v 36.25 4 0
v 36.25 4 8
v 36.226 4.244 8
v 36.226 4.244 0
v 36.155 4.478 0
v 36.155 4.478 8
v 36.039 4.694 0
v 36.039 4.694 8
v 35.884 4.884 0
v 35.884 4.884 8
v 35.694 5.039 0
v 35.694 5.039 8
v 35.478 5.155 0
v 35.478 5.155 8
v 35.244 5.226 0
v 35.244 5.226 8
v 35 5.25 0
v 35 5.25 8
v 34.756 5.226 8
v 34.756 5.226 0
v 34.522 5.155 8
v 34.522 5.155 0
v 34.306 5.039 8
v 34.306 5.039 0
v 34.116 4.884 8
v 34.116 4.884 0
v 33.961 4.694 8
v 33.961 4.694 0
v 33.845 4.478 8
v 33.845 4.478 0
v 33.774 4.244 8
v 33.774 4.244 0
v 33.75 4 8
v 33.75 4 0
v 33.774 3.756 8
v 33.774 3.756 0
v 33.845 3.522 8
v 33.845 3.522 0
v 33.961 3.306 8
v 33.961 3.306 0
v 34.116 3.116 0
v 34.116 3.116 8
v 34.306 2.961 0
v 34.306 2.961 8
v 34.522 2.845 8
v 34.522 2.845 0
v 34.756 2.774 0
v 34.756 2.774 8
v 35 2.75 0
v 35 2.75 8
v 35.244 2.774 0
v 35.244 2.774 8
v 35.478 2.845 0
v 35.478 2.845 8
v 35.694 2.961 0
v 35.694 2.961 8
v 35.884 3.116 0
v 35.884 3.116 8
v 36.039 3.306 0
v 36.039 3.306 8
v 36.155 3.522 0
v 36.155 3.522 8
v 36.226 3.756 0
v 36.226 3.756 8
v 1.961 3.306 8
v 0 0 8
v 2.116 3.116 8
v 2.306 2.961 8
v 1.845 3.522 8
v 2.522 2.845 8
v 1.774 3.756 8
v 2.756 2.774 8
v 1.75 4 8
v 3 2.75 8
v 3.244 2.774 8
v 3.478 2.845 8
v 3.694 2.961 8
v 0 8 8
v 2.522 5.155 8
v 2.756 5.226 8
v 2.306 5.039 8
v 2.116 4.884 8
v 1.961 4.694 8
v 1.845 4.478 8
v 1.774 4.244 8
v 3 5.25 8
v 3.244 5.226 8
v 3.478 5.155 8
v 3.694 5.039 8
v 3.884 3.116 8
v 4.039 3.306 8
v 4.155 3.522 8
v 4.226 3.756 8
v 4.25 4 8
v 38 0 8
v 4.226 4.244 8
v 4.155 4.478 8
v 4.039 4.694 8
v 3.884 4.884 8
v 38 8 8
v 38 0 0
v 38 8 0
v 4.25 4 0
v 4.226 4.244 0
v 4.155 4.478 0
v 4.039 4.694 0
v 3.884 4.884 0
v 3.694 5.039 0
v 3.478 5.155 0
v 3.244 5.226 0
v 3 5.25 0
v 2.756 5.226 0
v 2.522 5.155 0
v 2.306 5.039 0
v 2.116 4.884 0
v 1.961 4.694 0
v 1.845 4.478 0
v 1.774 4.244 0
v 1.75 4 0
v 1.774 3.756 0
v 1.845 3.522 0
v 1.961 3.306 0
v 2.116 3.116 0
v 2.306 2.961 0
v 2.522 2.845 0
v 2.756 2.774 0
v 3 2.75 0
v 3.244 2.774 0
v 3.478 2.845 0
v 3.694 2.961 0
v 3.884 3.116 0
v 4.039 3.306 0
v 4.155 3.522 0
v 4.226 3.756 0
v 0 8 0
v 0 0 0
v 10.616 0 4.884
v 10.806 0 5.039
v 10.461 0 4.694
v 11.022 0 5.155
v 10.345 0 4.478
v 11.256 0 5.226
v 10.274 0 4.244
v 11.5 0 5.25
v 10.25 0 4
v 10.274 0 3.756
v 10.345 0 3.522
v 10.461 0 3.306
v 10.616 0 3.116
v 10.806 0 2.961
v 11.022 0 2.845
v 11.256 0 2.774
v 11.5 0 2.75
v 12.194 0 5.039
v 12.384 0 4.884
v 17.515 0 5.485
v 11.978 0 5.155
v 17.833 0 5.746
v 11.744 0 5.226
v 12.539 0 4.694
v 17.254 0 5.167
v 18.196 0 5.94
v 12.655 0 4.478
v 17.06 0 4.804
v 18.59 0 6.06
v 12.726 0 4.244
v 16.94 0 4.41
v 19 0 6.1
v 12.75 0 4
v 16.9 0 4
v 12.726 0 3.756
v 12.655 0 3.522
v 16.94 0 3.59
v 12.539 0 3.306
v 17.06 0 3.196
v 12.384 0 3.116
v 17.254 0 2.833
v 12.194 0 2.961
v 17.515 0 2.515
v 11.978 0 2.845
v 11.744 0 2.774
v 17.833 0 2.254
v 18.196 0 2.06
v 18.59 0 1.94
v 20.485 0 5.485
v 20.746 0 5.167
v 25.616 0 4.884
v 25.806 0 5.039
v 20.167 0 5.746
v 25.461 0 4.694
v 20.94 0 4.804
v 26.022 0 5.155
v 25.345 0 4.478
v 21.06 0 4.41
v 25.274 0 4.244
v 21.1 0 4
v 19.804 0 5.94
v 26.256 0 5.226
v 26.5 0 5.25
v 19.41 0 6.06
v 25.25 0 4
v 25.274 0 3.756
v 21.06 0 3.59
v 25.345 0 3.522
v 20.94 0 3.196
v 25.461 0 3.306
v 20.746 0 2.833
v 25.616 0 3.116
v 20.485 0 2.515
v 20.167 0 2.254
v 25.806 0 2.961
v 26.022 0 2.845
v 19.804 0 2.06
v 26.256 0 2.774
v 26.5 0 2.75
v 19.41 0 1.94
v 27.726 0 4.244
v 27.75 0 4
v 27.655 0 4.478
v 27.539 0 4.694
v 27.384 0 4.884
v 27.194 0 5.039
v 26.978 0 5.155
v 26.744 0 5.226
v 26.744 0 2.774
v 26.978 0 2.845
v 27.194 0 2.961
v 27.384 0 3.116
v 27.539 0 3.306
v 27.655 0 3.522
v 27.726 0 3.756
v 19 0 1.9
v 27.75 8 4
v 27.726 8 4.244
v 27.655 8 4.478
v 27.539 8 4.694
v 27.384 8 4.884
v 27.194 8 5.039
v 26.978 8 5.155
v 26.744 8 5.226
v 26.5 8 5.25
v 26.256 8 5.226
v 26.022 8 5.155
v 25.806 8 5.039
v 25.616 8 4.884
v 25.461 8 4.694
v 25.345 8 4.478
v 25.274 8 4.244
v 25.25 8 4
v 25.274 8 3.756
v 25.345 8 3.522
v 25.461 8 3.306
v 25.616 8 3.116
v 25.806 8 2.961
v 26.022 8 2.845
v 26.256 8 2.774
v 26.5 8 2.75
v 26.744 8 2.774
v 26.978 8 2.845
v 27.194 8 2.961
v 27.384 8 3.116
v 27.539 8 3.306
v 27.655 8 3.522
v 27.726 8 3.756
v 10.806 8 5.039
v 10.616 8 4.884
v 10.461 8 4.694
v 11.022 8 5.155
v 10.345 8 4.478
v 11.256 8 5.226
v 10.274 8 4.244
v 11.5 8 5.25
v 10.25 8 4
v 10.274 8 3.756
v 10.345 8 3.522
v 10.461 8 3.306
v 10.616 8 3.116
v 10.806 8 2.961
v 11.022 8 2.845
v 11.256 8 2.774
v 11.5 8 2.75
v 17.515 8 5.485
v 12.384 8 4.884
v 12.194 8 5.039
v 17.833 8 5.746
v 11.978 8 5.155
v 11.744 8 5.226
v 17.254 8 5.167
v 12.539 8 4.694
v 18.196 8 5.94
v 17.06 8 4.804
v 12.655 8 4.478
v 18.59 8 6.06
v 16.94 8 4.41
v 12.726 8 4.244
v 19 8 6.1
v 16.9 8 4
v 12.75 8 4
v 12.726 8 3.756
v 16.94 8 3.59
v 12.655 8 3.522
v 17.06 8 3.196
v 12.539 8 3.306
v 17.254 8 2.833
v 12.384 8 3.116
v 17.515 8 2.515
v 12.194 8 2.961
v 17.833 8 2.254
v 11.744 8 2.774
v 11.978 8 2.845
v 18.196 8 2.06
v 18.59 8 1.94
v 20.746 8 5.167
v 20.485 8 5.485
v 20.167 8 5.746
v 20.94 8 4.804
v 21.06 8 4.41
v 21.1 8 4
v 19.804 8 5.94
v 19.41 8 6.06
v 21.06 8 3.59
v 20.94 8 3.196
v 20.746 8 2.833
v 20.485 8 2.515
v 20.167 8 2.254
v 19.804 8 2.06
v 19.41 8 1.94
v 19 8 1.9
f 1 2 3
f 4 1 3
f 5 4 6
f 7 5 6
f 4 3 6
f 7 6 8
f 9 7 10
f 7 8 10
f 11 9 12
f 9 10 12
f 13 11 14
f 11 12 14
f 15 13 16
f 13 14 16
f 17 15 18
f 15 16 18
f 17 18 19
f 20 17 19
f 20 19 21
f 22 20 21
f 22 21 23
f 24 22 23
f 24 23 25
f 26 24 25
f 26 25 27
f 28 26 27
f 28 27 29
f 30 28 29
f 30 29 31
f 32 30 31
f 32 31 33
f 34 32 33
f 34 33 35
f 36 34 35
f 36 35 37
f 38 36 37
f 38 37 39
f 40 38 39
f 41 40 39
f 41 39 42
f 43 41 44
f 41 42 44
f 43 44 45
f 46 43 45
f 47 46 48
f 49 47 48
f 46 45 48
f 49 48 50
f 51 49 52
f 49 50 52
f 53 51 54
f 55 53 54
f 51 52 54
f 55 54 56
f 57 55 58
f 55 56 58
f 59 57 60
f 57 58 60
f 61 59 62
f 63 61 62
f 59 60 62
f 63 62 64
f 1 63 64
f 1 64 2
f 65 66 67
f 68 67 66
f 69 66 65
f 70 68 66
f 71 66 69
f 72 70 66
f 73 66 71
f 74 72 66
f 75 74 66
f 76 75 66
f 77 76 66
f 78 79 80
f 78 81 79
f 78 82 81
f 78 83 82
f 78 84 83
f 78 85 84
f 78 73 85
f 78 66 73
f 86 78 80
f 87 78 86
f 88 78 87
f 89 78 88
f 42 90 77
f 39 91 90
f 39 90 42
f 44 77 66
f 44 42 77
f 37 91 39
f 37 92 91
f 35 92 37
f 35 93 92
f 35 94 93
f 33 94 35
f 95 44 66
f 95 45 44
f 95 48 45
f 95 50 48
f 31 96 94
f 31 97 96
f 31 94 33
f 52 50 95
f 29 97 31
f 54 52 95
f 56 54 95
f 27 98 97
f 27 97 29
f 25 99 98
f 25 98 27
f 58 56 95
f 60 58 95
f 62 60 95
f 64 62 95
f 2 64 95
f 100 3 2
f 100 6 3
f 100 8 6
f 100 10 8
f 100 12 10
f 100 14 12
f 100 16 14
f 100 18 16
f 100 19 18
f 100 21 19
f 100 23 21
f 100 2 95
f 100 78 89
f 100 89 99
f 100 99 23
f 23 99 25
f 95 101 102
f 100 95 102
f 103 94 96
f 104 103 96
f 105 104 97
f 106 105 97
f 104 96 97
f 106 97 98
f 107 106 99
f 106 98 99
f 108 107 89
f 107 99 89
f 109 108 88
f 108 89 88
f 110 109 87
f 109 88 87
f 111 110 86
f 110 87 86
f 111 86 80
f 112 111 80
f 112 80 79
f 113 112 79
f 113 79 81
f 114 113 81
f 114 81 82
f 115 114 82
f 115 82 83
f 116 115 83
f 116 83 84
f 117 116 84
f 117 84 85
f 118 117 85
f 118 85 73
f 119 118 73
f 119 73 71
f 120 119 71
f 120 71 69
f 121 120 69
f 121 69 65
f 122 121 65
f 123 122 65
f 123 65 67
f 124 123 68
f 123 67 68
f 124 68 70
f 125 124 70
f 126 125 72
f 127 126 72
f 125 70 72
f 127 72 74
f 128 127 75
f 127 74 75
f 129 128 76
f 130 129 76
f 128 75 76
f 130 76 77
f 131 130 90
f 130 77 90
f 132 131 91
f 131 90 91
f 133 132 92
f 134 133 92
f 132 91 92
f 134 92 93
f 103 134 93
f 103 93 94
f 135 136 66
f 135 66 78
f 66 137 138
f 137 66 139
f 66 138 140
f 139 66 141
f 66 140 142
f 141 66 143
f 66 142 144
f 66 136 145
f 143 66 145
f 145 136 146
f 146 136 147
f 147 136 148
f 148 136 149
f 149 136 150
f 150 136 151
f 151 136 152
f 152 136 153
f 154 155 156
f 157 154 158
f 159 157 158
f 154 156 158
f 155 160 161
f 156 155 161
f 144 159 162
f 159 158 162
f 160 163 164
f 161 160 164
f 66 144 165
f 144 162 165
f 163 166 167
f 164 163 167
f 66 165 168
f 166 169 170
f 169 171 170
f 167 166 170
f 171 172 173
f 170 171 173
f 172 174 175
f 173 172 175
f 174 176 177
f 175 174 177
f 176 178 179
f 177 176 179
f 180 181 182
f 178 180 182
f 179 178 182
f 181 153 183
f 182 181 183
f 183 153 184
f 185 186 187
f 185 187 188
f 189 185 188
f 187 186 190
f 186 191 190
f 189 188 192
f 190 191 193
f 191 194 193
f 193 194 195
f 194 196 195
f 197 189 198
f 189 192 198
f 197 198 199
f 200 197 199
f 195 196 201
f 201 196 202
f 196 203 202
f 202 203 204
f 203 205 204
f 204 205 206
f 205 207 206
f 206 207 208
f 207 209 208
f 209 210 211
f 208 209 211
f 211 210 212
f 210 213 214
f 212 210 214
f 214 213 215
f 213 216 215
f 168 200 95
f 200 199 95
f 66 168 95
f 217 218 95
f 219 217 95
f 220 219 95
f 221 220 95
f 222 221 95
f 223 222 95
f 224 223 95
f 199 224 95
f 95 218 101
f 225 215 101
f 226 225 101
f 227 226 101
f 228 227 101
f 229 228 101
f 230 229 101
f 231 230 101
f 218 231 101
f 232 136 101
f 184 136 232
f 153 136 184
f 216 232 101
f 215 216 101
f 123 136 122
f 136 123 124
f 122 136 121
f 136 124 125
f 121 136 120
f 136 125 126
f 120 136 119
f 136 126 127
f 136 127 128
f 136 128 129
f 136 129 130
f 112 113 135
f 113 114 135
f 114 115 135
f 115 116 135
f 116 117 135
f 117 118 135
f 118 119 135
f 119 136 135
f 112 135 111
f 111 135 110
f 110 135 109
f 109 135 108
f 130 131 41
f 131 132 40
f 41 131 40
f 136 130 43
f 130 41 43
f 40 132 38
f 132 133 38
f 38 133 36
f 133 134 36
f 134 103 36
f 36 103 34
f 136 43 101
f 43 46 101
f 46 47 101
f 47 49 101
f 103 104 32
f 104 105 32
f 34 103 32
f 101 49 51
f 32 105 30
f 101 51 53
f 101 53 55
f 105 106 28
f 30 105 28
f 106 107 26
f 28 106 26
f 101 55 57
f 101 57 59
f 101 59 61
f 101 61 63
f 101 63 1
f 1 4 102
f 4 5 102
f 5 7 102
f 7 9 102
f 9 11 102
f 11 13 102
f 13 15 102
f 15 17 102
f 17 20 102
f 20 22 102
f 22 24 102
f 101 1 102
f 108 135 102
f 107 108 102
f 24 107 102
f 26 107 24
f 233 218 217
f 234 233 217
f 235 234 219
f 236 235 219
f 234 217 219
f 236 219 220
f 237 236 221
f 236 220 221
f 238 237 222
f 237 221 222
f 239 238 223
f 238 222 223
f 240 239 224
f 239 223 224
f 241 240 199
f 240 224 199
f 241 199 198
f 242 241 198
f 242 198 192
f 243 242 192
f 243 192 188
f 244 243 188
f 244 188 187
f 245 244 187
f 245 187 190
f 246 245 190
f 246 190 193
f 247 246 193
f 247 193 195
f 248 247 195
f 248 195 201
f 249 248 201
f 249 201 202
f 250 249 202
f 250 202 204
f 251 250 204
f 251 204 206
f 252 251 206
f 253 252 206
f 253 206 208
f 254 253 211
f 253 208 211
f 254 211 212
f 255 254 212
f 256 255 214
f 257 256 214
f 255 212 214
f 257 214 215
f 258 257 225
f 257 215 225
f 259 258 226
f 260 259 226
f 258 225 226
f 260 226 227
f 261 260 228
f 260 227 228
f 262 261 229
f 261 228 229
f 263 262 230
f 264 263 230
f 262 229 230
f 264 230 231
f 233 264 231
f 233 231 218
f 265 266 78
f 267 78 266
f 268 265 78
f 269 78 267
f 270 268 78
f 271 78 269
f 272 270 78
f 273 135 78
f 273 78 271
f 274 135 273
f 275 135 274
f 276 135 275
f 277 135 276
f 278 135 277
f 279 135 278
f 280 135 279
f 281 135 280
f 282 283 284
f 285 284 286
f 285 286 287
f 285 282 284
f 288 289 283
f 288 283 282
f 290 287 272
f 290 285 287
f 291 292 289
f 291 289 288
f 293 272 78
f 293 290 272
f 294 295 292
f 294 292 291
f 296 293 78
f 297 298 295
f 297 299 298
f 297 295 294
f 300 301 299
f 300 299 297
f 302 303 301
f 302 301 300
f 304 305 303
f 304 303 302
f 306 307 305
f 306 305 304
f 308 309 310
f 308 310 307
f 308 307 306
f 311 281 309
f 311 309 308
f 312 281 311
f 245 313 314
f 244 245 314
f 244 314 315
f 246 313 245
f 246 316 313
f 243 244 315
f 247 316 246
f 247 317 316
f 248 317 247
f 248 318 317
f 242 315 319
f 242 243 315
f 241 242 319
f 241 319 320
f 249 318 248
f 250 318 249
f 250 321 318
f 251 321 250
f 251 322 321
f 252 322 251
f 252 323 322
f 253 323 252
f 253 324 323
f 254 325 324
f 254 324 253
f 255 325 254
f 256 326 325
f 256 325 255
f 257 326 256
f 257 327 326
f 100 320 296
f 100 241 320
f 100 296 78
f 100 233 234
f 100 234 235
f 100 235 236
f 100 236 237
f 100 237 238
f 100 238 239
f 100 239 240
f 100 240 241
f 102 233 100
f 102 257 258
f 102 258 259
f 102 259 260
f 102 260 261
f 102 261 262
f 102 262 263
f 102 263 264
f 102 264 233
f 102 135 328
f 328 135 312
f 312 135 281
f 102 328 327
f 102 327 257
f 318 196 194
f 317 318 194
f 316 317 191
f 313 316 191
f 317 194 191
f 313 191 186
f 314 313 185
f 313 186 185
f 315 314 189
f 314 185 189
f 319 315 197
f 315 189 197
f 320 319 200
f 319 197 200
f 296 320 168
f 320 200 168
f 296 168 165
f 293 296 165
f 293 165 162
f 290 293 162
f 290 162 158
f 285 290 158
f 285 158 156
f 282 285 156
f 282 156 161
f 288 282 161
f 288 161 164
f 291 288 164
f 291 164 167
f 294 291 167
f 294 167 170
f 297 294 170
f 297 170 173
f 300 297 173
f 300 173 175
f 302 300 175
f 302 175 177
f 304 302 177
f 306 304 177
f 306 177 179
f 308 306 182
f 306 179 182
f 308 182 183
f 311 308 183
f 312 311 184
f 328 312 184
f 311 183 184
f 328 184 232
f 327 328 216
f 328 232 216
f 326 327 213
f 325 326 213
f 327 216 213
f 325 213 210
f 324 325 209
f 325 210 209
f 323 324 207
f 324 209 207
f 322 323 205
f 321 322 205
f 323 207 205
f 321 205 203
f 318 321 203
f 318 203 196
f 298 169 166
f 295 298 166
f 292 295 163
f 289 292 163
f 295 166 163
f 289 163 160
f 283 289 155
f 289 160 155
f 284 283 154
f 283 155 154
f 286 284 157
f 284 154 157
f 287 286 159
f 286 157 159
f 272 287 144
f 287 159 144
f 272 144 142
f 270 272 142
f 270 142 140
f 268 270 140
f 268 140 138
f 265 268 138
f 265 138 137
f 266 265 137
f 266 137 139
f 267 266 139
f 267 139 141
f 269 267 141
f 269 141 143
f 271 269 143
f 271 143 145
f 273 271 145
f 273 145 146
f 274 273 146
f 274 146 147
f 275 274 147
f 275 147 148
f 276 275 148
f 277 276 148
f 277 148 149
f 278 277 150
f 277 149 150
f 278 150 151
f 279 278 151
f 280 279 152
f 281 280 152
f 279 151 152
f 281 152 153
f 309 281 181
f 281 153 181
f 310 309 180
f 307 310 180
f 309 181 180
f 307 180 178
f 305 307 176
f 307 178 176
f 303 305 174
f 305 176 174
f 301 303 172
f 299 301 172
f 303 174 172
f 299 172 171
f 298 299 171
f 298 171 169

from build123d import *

# Parameters (mm, degrees)
SKETCH1_W                   = 38
SKETCH1_H                   = 8
BOSS_EXTRUDE1_DEPTH         = 8
TAP_DRILL_FOR_M5X0_8_TAP1_D = 4.2
TAP_DRILL_FOR_M3X0_5_TAP1_D = 2.5
TAP_DRILL_FOR_M3X0_5_TAP2_D = 2.5


with BuildPart() as part:
    # Sketch1 → Boss-Extrude1 (new body)
    with BuildSketch(Plane.XY):
        with Locations((19, 4)):
            Rectangle(SKETCH1_W, SKETCH1_H)
    extrude(amount=BOSS_EXTRUDE1_DEPTH)

    # Tap Drill for M5x0.8 Tap1 (through all)
    with Locations(Plane(origin=(0, 8, 0), x_dir=(-1, 0, 0), z_dir=(0, 1, 0))):
        with Locations((-19, 4)):
            Hole(TAP_DRILL_FOR_M5X0_8_TAP1_D / 2)

    # Tap Drill for M3x0.5 Tap1 (through all)
    with Locations(Plane(origin=(0, 0, 0), x_dir=(-1, 0, 0), z_dir=(0, 0, -1))):
        with Locations((-35, 4), (-3, 4)):
            Hole(TAP_DRILL_FOR_M3X0_5_TAP1_D / 2)

    # Tap Drill for M3x0.5 Tap2 (through all)
    with Locations(Plane(origin=(0, 8, 0), x_dir=(-1, 0, 0), z_dir=(0, 1, 0))):
        with Locations((-11.5, 4), (-26.5, 4)):
            Hole(TAP_DRILL_FOR_M3X0_5_TAP2_D / 2)


solid = part.part
